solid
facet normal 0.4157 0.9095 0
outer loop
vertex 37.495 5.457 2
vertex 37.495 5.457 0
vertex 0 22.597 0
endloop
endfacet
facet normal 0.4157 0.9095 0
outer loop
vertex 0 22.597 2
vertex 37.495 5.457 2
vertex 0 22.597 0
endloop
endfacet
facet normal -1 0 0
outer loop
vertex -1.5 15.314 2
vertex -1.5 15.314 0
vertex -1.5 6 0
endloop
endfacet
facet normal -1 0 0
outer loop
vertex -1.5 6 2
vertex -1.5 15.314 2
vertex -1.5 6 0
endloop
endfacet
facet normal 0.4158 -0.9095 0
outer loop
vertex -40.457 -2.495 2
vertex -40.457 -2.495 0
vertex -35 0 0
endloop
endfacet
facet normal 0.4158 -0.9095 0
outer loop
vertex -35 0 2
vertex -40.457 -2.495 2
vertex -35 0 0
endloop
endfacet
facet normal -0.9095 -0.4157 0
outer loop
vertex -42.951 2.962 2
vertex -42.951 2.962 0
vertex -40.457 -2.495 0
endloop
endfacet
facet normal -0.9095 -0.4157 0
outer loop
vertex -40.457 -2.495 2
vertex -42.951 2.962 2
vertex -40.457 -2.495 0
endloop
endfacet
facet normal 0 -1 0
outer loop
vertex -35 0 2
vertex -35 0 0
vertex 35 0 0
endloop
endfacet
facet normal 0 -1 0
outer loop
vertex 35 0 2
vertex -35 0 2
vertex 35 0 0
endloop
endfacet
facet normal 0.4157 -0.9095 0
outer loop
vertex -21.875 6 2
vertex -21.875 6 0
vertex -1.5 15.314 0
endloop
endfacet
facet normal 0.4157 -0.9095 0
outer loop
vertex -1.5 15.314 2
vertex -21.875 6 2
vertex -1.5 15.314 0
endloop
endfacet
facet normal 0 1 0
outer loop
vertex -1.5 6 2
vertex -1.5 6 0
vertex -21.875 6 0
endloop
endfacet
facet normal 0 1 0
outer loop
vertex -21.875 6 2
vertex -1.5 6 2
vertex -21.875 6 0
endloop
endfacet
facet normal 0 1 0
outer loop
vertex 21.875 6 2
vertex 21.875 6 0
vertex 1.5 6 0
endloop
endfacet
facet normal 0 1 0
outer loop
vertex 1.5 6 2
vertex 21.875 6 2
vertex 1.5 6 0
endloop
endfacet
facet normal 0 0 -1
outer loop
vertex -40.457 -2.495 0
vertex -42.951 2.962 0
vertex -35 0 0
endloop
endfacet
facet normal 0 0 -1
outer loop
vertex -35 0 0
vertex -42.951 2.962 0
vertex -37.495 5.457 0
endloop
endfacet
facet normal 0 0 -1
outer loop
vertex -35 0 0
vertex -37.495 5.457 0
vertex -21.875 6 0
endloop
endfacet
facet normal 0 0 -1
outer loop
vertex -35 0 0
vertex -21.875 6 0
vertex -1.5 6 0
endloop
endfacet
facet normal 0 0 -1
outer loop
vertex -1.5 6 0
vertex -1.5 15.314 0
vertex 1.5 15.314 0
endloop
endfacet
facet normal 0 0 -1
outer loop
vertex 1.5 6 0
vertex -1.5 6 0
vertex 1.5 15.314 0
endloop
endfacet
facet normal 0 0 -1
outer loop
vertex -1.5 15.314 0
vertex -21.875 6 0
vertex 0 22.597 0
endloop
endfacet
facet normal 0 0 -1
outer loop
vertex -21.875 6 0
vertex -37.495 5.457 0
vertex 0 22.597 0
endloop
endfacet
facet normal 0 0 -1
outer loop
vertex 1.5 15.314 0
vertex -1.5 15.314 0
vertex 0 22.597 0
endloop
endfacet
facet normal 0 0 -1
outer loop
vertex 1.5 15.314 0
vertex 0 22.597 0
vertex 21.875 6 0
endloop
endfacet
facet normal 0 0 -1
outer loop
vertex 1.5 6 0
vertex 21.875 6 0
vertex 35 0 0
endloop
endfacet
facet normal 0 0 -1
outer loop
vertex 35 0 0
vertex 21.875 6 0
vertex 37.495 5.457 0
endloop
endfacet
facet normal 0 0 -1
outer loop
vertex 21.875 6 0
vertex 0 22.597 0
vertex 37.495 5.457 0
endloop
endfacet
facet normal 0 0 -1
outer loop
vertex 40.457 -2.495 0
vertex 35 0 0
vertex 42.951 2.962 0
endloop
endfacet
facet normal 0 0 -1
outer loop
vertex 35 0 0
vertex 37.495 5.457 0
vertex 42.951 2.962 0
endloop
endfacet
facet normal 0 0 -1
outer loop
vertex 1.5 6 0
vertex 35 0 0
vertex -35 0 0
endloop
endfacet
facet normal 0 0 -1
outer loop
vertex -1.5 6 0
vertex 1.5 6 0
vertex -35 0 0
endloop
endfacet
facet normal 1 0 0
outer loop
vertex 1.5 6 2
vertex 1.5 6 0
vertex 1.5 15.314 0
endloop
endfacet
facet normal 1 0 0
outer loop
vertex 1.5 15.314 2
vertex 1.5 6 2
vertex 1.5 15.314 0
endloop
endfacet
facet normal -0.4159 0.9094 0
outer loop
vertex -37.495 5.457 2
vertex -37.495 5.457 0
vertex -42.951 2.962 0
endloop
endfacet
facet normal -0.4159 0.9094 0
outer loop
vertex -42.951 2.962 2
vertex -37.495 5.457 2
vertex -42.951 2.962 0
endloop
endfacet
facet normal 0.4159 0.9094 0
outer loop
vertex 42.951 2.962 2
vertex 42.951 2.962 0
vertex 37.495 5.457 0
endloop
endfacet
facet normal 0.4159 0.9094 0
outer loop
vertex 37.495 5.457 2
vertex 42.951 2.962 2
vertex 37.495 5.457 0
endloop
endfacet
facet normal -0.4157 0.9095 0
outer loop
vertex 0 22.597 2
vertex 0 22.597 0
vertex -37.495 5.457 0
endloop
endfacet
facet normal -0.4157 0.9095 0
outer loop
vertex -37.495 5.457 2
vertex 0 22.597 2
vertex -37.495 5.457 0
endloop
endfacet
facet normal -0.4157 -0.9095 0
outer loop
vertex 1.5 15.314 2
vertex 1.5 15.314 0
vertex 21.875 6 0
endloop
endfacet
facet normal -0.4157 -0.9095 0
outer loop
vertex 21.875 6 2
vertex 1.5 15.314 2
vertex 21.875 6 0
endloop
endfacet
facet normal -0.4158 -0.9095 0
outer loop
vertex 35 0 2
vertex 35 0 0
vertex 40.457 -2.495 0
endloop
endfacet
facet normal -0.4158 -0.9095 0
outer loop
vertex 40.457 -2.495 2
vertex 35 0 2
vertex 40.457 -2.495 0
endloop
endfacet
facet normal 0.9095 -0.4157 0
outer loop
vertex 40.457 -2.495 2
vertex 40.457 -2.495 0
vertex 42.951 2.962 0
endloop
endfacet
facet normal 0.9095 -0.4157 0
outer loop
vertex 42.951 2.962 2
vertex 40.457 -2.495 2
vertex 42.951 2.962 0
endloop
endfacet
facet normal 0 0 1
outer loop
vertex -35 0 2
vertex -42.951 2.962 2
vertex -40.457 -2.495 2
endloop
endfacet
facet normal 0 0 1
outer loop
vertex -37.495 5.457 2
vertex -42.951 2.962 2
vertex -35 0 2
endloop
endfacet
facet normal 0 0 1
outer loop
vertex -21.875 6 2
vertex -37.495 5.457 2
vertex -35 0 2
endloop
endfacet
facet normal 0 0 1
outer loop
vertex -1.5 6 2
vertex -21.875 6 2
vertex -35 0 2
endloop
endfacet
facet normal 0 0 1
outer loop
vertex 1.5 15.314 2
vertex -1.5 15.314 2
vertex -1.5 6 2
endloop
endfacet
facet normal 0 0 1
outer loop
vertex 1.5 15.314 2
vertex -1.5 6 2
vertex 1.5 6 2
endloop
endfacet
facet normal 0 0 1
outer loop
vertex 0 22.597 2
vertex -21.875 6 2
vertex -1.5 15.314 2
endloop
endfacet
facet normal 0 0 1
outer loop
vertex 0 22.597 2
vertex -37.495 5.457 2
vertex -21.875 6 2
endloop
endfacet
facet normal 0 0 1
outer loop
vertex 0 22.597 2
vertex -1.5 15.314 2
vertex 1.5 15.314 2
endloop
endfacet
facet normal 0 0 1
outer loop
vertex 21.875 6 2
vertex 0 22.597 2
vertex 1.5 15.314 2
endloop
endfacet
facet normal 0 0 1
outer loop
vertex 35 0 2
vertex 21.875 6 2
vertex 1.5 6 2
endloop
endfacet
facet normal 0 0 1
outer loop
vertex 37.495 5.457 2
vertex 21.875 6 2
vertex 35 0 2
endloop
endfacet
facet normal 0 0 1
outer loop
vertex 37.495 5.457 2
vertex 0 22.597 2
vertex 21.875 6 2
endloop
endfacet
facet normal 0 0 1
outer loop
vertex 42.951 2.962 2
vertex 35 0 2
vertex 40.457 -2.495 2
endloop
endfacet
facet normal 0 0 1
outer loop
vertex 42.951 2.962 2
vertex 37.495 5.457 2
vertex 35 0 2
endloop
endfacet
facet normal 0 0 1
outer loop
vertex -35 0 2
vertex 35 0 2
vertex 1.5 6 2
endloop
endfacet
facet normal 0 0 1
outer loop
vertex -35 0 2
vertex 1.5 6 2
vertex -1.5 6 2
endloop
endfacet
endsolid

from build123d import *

# Parameters (mm, degrees)
F1_DEPTH = 2


with BuildPart() as f1:
    # F0 (on Top) → F1 (new body)
    with BuildSketch(Plane.XY):
        Polygon((-35, 0), (0, 0), (35, 0), (40.456847, -2.494559), (42.951405, 2.962288), (37.494559, 5.456847), (0, 22.597216), (-37.494559, 5.456847), (-42.951405, 2.962288), (-40.456847, -2.494559), align=None)
        Polygon((-21.875, 6), (-1.5, 15.314286), (-1.5, 6), align=None, mode=Mode.SUBTRACT)
        Polygon((1.5, 6), (1.5, 15.314286), (21.875, 6), align=None, mode=Mode.SUBTRACT)
    extrude(amount=F1_DEPTH)


solid = f1.part
